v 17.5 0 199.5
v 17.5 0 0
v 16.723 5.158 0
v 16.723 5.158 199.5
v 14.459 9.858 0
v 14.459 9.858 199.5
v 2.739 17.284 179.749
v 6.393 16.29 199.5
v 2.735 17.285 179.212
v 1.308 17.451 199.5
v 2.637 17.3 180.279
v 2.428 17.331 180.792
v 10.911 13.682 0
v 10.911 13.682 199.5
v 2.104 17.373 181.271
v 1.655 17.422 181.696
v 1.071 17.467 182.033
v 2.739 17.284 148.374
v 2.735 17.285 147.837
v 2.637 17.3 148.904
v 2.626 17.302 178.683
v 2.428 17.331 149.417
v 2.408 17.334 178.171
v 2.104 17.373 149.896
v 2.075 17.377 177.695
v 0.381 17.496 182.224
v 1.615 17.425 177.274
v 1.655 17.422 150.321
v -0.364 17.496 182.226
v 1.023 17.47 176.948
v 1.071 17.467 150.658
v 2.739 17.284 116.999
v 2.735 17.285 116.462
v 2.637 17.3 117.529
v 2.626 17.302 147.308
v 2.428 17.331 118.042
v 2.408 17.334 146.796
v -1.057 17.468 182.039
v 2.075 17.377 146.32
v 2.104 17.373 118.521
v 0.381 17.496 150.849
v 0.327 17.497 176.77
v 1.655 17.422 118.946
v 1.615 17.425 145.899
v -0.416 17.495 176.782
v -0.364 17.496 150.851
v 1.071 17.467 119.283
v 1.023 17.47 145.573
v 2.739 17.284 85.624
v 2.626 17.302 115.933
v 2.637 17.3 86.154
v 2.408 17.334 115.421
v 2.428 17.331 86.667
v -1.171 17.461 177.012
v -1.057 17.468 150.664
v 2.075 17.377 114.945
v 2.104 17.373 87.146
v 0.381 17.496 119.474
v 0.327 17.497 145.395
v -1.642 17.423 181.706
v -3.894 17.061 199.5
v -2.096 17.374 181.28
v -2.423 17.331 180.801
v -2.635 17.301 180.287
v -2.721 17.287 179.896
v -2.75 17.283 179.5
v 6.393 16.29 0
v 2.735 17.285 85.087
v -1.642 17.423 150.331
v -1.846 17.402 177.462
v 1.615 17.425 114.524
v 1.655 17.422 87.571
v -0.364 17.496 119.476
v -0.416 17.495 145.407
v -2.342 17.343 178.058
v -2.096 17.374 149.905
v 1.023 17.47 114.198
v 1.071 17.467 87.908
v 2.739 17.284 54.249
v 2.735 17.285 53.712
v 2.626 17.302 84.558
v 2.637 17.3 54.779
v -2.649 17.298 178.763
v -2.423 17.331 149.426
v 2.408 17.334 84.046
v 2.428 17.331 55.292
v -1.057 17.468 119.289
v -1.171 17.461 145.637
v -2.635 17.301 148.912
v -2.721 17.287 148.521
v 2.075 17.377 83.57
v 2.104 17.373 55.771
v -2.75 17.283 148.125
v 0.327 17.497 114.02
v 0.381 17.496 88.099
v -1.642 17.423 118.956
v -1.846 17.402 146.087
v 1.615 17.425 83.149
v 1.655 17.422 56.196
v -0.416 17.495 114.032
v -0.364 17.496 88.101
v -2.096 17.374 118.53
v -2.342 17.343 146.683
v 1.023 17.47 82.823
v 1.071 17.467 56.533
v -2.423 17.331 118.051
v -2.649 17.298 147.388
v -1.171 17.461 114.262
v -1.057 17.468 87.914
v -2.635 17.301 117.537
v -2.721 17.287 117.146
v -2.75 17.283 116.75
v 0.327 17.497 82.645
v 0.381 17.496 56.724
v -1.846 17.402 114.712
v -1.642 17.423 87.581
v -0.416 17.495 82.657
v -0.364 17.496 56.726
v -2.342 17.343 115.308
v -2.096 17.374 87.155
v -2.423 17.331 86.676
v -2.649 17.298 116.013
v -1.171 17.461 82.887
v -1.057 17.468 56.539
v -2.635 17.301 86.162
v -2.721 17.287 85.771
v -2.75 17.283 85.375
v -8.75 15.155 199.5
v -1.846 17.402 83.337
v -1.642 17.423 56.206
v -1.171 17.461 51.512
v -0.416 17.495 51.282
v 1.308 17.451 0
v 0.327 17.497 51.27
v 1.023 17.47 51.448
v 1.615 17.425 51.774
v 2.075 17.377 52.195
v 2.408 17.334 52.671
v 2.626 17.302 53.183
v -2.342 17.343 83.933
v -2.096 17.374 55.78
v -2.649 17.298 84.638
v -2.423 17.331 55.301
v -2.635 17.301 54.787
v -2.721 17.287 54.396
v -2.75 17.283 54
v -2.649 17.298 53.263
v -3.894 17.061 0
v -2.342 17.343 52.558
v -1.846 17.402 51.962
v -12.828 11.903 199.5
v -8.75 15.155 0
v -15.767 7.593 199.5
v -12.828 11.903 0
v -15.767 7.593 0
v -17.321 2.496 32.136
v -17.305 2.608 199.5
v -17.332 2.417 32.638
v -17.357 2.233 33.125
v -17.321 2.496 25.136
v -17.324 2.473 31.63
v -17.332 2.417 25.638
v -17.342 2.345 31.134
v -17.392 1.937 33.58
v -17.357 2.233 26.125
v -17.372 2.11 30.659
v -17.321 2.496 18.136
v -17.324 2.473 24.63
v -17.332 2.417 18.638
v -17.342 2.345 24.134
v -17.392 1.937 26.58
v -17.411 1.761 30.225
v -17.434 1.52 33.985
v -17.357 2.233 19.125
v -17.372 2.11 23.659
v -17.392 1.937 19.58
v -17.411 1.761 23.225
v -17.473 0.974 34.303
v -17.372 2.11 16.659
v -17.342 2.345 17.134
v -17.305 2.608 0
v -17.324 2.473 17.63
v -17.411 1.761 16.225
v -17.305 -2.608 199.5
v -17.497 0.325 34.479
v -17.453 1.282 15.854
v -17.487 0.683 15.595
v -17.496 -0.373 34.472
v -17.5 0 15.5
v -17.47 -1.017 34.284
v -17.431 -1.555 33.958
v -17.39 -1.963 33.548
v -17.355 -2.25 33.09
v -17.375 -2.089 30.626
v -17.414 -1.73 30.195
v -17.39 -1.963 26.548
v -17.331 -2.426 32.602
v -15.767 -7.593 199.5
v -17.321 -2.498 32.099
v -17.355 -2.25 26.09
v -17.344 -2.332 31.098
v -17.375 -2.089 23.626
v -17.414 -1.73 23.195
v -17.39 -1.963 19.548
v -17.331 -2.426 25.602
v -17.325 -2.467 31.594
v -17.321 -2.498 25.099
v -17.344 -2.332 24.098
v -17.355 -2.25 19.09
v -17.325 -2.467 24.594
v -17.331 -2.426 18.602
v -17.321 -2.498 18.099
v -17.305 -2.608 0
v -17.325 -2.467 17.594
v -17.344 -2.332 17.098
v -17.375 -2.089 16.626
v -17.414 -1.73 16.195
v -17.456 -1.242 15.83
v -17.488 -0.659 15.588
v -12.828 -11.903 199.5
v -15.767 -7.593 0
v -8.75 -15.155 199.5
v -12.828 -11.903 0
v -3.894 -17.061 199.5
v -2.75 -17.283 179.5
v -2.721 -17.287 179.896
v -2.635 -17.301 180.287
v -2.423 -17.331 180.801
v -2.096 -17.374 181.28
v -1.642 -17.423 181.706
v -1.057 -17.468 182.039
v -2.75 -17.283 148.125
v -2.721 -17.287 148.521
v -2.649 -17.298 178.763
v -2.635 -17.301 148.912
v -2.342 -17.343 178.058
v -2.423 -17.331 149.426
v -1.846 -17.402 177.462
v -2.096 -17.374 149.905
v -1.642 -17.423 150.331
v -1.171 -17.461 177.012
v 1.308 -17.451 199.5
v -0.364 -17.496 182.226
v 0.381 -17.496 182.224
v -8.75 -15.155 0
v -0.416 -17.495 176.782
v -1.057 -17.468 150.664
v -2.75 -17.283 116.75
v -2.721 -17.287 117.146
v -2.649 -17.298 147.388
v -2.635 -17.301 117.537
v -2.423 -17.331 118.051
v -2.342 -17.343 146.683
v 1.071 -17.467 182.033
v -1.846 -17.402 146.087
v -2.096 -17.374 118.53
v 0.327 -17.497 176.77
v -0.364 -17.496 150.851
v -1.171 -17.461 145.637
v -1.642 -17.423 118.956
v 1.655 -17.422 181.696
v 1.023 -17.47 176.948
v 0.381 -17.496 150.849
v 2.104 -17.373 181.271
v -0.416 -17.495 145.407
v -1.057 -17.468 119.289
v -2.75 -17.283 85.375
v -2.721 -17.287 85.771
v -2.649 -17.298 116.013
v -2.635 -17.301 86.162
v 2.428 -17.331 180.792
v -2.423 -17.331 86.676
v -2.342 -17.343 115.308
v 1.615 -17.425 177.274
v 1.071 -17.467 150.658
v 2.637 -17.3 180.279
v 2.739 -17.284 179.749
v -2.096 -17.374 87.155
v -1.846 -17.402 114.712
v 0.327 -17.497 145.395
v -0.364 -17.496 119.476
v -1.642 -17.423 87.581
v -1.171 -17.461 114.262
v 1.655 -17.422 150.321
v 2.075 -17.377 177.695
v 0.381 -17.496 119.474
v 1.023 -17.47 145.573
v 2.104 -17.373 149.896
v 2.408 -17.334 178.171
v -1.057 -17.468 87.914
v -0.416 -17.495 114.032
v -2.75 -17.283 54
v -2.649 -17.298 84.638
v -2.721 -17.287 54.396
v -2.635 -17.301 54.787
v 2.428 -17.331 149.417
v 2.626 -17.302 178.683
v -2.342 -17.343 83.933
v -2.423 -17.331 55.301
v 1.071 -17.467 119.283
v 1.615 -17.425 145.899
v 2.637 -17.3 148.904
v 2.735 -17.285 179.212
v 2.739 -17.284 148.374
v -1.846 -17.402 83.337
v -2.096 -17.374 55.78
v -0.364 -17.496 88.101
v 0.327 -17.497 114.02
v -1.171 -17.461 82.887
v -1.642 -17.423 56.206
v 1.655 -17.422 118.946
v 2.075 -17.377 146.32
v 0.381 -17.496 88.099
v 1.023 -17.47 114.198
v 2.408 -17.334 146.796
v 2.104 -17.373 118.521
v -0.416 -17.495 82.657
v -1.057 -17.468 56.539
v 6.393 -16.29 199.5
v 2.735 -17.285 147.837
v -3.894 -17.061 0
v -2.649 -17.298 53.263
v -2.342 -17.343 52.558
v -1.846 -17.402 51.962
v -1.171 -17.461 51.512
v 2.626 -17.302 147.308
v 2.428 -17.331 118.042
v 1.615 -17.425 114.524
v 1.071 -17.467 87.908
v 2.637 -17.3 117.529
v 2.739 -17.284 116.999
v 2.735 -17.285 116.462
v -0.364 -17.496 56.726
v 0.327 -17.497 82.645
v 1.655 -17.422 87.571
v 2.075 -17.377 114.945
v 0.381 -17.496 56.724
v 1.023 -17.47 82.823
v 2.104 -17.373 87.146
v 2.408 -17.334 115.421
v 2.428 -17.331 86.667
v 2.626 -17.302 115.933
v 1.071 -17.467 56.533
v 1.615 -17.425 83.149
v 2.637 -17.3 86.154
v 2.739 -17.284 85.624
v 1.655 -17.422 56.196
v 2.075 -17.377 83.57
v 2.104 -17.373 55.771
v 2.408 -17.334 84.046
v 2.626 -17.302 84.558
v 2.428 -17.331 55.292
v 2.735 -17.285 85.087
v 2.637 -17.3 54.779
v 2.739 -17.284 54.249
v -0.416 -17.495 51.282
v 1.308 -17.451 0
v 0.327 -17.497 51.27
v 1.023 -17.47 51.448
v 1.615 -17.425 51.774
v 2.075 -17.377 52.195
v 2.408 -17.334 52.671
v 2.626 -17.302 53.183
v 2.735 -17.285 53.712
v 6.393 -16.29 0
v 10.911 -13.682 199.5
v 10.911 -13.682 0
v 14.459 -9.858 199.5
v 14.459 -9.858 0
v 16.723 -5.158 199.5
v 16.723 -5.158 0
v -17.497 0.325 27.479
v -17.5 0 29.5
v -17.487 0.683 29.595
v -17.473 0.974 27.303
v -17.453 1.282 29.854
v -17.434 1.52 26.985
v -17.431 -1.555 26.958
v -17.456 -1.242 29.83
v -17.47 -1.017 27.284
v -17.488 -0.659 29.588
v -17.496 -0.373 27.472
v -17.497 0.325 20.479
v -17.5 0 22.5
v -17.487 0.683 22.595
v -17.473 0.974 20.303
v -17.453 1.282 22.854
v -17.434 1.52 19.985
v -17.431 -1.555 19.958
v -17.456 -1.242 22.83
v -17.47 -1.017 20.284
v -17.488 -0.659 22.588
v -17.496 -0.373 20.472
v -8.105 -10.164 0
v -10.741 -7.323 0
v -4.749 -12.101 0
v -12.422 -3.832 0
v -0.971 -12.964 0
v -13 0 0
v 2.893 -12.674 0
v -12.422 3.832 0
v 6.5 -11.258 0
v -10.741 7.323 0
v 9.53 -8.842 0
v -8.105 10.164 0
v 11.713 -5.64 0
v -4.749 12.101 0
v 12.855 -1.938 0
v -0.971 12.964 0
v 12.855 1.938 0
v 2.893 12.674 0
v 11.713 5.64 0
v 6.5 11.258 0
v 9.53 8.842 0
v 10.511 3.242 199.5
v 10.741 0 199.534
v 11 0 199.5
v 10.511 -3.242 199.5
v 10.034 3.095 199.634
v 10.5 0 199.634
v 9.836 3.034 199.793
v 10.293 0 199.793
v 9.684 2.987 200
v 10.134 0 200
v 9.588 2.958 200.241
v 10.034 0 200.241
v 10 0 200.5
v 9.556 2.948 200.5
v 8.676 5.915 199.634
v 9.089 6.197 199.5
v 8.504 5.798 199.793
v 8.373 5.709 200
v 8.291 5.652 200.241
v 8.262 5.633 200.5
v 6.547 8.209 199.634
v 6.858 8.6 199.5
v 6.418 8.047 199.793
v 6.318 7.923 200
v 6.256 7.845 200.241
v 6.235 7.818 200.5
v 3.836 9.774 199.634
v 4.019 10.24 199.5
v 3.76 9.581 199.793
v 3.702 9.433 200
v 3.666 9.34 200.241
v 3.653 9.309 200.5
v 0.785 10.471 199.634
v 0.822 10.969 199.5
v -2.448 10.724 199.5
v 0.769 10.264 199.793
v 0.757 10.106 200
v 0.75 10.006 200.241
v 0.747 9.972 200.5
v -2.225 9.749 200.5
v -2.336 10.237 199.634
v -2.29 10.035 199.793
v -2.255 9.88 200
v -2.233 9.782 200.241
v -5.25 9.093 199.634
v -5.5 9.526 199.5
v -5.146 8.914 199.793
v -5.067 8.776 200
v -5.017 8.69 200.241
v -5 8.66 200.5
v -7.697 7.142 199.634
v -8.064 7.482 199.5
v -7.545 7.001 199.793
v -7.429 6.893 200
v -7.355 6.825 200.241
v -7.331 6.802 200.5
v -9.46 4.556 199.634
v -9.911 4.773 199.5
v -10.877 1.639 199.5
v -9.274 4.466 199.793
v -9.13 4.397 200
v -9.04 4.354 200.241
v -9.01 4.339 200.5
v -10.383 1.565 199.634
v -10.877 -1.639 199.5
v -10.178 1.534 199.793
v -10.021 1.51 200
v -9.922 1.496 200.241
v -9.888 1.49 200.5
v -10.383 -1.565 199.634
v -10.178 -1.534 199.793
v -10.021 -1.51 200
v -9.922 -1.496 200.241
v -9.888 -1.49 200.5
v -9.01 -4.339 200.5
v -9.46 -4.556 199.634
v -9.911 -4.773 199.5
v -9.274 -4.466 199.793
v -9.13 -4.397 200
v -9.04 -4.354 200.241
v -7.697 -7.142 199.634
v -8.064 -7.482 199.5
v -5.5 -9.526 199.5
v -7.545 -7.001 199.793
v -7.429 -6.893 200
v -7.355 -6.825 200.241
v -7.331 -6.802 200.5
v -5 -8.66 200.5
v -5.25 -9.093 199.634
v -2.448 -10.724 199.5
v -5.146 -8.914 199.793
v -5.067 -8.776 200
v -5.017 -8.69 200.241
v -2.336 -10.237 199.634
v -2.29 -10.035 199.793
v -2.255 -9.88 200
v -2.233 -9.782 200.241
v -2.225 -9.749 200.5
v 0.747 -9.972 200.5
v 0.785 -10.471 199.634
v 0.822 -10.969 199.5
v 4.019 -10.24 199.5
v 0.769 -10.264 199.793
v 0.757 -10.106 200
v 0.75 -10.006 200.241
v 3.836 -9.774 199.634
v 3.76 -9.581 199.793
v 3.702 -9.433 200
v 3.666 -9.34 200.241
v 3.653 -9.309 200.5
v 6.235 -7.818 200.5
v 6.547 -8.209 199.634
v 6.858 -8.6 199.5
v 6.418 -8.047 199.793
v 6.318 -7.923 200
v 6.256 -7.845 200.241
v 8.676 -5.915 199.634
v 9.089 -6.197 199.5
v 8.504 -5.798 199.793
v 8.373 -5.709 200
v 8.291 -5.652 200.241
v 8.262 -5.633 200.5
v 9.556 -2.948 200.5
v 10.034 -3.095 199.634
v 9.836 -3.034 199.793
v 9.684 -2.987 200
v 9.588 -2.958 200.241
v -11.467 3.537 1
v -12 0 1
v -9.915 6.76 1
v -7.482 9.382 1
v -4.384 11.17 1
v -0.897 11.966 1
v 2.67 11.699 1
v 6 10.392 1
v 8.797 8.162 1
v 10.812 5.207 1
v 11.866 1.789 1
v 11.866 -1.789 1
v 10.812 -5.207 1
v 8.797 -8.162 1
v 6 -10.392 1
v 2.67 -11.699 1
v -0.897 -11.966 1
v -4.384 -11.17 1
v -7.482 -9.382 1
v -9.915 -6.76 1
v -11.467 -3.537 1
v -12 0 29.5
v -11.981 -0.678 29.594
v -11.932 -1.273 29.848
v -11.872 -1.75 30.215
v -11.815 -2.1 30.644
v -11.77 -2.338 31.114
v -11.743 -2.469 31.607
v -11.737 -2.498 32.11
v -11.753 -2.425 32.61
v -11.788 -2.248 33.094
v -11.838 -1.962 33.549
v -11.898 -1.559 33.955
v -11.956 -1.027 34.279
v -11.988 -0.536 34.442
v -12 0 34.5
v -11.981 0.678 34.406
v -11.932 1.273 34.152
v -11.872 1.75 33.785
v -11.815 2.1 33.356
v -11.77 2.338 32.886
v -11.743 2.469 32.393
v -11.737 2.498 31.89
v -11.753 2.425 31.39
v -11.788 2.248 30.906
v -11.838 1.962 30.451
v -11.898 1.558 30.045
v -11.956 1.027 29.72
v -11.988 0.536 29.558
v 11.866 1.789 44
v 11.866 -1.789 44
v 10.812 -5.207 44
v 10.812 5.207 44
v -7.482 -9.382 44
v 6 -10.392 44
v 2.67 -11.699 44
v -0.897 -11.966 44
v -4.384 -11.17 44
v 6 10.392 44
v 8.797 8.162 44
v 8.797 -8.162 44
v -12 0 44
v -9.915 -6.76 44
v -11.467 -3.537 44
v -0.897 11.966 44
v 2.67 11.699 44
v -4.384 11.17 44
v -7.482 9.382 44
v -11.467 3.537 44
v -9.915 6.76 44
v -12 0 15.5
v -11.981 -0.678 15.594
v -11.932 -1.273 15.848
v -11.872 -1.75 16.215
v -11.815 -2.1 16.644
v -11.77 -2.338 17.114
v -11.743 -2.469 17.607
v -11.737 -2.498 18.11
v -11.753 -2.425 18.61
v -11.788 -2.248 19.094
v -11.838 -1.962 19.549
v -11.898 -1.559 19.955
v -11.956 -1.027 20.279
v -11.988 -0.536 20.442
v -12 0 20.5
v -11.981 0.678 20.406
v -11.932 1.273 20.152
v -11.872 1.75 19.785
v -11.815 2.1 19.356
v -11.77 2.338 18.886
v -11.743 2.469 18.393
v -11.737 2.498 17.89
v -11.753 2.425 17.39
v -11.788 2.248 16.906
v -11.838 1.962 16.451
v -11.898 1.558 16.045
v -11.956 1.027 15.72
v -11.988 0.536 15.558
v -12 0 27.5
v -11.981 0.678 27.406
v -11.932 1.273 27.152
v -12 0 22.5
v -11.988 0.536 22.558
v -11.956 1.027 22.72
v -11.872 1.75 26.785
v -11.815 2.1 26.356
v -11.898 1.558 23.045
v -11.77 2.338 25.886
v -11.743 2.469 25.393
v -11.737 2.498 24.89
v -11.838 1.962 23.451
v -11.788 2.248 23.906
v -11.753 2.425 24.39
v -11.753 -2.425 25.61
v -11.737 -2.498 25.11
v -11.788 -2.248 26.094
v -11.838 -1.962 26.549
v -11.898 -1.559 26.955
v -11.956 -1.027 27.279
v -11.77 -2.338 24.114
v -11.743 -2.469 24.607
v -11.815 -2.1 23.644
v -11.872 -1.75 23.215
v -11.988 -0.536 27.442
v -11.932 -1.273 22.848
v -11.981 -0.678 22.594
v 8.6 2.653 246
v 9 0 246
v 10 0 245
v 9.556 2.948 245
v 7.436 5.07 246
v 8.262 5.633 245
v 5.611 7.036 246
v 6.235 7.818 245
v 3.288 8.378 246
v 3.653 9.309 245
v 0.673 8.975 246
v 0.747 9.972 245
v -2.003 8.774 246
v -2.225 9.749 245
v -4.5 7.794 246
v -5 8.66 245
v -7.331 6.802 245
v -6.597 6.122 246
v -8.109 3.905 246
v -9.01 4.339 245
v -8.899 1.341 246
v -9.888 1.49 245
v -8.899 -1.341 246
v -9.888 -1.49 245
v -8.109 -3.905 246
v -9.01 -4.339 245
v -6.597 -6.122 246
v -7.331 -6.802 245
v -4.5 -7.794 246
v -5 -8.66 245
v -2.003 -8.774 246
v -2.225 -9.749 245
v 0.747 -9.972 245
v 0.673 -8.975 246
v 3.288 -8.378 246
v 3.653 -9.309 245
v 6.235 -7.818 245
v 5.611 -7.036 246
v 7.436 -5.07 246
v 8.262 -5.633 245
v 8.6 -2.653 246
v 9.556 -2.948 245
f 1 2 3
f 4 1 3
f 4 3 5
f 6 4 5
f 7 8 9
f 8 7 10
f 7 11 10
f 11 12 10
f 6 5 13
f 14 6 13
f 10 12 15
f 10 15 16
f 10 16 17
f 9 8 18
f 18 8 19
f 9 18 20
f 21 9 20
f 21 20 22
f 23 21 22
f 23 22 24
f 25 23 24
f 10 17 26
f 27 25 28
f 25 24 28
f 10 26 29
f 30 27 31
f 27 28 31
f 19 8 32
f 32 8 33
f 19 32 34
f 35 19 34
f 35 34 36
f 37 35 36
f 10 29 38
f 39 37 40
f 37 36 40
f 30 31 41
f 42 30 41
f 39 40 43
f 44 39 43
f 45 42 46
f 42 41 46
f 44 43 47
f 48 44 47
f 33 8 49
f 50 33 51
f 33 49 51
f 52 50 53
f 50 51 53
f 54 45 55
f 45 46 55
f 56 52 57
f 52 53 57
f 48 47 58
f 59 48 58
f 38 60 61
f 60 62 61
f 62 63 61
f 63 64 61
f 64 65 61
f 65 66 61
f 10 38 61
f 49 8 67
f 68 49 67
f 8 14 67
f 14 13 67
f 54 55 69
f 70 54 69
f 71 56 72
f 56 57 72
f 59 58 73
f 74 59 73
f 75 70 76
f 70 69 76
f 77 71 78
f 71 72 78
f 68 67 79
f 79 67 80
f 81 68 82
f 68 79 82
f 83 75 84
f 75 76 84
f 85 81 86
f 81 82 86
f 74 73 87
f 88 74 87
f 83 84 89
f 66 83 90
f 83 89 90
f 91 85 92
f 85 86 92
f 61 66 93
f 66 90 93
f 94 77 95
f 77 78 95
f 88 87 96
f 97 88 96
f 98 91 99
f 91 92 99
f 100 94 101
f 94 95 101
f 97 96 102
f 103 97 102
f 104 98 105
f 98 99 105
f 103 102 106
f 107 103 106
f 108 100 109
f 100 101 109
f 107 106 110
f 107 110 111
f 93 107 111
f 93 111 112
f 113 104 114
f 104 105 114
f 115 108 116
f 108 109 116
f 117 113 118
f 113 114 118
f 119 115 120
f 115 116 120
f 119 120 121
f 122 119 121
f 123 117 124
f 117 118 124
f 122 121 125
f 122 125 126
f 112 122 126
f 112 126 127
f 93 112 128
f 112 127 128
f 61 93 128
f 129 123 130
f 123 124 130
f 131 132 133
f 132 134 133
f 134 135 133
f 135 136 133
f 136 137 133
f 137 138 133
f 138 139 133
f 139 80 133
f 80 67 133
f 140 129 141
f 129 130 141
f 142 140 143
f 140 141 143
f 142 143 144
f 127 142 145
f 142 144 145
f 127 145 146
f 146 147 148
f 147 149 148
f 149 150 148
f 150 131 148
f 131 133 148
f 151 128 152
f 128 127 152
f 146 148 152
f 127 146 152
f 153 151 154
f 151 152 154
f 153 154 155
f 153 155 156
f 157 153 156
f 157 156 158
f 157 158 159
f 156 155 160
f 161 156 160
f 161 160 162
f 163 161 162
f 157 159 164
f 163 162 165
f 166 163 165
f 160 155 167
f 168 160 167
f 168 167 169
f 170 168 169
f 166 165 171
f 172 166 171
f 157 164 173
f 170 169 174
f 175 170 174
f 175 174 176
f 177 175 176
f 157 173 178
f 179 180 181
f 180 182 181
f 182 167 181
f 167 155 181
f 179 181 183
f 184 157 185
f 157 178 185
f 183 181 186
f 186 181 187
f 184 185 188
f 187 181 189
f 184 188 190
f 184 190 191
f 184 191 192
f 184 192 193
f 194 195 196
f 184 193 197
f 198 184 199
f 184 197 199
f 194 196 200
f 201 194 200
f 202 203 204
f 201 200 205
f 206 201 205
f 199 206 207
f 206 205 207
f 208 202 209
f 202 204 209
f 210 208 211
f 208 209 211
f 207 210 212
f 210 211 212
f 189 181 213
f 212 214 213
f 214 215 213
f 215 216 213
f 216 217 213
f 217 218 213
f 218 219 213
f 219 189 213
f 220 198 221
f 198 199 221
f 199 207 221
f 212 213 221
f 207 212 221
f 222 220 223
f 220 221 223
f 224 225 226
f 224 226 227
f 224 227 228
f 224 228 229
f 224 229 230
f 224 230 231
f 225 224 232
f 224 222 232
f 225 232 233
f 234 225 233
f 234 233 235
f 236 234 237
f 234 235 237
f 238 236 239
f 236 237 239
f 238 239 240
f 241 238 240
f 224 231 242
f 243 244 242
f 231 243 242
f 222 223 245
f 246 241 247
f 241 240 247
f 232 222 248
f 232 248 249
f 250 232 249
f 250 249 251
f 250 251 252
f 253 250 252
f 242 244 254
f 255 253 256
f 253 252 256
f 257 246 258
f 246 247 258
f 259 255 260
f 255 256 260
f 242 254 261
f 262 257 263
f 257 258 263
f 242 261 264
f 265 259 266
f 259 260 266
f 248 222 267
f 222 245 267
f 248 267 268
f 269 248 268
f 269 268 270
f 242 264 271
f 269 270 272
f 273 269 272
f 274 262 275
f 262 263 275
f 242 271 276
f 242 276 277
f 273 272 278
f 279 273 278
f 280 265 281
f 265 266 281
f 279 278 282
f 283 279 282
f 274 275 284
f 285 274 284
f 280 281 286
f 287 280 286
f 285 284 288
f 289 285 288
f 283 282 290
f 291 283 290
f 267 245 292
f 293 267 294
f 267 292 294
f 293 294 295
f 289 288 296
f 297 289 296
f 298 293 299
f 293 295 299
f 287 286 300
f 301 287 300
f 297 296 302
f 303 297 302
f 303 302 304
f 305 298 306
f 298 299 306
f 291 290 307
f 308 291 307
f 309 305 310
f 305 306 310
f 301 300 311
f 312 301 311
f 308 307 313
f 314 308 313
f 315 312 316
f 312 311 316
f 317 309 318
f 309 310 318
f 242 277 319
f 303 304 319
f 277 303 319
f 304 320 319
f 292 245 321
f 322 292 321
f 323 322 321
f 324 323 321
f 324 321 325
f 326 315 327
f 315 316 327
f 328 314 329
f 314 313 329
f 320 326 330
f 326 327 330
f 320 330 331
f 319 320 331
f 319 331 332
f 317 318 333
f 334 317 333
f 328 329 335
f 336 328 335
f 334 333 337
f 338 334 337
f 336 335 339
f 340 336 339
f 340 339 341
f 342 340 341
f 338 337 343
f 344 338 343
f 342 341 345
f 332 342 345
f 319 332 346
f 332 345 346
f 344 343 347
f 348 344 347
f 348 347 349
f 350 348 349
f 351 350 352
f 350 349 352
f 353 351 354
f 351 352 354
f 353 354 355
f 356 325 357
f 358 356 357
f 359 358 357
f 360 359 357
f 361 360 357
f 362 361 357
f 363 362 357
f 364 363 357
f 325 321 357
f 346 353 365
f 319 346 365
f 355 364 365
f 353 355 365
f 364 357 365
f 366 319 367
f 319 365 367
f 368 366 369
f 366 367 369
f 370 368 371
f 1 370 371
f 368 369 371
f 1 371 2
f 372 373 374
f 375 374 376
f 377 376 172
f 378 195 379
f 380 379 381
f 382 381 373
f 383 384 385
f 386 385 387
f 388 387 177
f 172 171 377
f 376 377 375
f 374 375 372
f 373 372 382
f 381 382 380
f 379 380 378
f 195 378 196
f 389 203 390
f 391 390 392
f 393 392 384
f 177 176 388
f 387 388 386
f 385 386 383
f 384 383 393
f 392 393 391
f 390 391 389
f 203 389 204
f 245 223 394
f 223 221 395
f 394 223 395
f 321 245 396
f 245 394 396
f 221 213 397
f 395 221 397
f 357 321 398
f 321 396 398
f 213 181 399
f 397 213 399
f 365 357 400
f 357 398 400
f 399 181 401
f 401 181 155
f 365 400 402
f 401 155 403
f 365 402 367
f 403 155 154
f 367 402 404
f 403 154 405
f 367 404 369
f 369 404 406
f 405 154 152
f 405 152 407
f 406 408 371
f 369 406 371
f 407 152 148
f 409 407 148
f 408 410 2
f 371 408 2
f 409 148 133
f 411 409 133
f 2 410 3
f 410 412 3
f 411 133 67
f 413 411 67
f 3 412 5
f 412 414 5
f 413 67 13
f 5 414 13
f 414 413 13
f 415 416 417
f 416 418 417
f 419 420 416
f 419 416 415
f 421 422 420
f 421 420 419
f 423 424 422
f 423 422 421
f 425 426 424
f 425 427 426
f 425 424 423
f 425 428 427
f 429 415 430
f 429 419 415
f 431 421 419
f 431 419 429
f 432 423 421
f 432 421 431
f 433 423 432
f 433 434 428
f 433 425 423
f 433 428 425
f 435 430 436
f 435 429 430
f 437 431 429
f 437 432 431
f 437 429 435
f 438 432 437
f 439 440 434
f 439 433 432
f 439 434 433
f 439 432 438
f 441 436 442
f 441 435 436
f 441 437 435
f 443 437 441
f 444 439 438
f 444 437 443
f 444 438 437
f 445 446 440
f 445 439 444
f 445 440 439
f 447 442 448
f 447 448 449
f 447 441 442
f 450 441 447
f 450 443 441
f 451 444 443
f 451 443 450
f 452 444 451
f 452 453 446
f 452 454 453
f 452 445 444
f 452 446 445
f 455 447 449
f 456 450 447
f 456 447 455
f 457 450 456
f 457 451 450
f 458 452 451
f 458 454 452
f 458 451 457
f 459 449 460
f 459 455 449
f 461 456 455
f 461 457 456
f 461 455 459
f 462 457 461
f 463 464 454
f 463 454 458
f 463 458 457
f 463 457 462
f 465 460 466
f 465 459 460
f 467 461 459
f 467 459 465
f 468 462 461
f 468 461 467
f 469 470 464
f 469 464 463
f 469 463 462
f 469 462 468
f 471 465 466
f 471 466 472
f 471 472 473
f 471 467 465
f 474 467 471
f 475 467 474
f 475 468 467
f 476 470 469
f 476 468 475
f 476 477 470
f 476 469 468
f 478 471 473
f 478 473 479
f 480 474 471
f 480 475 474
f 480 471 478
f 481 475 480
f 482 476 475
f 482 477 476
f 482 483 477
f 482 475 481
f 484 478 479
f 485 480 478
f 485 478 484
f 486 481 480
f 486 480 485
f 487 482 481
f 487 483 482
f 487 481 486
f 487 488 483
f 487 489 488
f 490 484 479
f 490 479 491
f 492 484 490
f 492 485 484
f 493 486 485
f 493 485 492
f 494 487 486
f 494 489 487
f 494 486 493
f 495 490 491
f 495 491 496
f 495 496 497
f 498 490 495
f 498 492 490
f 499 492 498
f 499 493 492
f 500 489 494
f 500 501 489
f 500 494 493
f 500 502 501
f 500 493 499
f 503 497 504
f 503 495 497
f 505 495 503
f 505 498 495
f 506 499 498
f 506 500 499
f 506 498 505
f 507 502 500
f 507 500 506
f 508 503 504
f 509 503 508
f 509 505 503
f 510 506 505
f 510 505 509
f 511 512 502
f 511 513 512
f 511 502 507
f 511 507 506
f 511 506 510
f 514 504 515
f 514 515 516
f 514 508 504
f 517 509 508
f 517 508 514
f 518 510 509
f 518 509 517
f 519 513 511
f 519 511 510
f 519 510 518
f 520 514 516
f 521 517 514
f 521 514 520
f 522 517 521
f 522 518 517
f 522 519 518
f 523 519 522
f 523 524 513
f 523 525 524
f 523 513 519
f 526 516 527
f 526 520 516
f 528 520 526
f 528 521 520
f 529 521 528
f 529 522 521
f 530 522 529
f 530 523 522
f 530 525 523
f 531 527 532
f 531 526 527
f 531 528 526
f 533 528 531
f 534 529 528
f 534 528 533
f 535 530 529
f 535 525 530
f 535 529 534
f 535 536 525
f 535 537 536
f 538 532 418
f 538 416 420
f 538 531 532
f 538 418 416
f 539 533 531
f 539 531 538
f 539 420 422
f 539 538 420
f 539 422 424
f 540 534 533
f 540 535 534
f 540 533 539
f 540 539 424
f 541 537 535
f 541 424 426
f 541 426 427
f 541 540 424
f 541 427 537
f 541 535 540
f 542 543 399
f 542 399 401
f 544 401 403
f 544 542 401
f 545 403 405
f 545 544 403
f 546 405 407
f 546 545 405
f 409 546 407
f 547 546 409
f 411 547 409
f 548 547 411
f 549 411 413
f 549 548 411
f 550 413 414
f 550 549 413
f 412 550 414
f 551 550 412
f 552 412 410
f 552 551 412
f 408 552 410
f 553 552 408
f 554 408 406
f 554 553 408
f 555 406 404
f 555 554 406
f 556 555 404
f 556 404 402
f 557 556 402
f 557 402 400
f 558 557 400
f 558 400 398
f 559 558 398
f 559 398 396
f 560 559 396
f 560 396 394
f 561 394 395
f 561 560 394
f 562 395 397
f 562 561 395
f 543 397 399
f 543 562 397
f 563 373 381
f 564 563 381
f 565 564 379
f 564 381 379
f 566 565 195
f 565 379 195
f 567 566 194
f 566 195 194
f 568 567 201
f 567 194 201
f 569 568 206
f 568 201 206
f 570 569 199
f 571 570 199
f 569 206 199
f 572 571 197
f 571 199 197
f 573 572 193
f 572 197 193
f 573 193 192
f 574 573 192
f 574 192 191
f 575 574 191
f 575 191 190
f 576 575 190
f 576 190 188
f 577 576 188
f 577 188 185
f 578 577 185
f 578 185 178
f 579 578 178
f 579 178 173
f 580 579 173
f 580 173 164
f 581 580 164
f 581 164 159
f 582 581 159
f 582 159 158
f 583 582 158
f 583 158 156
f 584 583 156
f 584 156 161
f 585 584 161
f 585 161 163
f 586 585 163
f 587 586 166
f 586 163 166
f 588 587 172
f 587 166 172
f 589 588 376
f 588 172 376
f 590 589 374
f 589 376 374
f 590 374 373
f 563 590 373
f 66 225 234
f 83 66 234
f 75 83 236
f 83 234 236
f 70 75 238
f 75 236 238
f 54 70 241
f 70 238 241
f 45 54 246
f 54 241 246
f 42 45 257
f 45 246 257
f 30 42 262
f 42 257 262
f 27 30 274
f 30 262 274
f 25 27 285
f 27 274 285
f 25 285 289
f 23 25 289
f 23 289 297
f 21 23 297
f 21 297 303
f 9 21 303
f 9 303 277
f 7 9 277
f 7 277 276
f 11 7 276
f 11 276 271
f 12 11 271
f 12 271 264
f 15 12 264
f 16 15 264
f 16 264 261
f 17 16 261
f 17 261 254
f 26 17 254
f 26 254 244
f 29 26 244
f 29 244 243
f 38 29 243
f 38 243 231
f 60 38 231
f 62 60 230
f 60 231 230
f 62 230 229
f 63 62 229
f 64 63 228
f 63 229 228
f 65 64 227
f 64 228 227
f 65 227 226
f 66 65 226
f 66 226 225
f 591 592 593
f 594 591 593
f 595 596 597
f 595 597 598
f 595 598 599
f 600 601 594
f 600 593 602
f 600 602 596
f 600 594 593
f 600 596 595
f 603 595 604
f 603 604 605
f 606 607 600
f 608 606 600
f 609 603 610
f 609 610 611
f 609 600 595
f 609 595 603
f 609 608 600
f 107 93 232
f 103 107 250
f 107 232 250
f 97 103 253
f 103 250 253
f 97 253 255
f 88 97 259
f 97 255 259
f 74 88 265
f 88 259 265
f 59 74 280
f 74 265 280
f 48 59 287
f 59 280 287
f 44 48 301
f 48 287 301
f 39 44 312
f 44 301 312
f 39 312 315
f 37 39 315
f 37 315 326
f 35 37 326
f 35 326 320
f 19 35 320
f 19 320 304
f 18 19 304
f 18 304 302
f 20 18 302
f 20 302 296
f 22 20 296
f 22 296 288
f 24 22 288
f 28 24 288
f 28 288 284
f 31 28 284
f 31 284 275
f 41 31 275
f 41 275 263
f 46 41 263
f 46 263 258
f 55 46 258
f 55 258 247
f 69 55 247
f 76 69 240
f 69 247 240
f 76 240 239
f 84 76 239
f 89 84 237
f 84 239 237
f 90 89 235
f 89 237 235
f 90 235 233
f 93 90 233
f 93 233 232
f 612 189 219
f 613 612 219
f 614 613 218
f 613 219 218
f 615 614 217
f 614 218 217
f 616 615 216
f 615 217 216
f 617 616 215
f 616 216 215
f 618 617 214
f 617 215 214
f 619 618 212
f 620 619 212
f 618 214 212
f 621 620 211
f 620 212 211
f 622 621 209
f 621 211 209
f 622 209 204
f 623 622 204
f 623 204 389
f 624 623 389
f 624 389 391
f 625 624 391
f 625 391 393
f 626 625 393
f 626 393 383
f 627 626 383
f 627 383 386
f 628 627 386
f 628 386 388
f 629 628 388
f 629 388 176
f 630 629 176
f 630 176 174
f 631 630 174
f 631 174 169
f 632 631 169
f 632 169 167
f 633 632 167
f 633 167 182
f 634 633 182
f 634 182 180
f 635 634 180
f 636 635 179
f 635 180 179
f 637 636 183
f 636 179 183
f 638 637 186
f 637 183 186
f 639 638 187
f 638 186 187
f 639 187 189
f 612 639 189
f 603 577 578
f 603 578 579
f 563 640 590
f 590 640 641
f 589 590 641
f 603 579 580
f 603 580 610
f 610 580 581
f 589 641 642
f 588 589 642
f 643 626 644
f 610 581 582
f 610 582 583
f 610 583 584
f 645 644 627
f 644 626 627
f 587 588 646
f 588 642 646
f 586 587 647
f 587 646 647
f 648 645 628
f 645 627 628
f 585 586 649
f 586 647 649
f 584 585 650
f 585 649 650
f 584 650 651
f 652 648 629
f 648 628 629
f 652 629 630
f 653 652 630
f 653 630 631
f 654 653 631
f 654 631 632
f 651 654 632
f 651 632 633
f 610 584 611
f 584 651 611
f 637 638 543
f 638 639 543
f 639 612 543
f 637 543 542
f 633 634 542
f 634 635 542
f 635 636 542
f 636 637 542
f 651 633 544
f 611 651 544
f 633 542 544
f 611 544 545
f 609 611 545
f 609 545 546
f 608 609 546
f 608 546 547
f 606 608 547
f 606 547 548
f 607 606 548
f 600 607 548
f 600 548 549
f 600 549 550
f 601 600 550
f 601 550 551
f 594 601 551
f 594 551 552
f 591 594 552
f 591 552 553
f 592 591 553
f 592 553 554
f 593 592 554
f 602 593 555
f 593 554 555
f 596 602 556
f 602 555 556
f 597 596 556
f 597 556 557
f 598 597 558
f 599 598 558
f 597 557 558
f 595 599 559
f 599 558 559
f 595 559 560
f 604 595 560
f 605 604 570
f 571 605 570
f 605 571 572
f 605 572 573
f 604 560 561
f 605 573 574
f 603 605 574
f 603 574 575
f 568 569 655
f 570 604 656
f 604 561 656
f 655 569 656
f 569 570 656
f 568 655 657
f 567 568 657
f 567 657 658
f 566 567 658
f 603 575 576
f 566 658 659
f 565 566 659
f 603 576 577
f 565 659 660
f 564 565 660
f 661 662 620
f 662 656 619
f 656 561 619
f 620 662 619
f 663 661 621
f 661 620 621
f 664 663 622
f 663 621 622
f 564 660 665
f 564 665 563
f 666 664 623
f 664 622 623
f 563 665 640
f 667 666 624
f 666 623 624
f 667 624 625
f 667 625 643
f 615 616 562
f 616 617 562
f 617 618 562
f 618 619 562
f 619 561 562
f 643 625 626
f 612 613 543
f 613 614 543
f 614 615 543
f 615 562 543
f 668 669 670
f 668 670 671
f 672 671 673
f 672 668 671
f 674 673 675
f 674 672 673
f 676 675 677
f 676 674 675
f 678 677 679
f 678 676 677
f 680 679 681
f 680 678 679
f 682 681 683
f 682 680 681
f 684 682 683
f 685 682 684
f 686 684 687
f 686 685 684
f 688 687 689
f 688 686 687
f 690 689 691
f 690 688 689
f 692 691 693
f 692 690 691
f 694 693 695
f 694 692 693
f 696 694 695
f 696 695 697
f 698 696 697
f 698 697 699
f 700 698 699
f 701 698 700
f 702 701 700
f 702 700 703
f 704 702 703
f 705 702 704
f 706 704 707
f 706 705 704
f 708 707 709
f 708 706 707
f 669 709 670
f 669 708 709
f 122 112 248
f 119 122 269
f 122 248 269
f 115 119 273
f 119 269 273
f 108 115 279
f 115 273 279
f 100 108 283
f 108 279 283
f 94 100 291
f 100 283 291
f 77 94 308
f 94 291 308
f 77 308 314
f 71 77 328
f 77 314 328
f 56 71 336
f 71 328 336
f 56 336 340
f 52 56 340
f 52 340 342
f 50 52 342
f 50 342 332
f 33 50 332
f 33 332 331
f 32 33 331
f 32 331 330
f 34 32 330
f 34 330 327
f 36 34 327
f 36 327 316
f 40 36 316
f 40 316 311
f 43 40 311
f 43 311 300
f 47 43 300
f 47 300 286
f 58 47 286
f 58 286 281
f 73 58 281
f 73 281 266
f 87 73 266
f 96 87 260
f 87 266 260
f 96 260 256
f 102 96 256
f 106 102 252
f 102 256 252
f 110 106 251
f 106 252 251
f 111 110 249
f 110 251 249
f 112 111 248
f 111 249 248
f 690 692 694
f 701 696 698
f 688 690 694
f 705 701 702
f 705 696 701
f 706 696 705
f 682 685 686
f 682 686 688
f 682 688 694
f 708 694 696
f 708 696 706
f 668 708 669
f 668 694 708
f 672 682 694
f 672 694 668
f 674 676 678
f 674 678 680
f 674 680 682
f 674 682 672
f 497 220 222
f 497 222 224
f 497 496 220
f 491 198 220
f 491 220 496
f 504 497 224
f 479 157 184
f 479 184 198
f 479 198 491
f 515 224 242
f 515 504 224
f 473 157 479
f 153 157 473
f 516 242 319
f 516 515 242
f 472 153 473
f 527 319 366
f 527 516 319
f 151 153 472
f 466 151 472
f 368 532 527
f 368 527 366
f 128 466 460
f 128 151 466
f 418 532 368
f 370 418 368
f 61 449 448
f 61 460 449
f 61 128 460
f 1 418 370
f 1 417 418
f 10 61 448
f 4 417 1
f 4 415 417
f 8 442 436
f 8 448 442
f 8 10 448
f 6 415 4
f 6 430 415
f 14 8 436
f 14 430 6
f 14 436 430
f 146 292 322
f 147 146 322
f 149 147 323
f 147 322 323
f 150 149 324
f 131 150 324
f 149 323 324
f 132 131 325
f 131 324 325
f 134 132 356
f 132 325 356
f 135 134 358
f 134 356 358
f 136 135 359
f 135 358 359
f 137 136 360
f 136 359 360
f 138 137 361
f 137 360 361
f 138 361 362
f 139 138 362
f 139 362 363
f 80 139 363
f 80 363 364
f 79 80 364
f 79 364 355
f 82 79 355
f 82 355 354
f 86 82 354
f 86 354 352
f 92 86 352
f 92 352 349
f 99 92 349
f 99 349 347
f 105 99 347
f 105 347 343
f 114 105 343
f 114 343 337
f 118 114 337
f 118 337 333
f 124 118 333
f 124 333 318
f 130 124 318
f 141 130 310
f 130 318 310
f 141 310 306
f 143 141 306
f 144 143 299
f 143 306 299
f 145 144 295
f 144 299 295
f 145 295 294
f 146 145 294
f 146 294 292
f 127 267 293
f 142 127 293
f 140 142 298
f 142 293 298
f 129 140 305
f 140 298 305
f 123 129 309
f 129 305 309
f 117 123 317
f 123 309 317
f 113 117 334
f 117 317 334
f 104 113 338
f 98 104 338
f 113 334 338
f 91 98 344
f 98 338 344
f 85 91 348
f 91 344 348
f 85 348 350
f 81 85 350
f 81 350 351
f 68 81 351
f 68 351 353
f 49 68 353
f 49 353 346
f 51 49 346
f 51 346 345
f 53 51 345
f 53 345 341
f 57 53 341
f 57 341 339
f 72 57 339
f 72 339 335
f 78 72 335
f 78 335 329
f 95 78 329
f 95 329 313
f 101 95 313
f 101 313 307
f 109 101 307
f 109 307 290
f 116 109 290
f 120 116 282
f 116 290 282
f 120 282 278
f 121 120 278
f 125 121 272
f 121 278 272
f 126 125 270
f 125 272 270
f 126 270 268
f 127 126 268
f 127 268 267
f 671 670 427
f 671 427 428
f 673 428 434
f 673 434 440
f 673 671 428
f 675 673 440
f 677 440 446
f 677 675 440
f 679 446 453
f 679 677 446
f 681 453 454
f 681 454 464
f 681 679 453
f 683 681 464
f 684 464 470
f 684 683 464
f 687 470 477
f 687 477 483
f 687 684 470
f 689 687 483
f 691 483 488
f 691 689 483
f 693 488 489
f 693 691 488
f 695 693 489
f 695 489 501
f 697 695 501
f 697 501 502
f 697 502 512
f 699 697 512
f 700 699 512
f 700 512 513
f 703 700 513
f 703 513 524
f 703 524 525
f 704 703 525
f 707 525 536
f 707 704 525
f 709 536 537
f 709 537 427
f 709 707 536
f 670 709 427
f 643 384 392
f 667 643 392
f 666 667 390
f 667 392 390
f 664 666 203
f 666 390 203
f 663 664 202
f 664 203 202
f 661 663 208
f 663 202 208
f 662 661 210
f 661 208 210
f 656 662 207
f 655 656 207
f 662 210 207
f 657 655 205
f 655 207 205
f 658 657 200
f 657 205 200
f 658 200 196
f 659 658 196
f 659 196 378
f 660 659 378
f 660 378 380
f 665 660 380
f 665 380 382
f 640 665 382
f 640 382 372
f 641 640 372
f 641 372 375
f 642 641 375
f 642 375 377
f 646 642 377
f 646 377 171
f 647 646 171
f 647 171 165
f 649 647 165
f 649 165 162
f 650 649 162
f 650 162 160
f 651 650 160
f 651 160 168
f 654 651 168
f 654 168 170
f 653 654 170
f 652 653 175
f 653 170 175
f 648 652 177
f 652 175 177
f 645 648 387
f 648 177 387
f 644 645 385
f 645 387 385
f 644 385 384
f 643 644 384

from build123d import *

# Parameters (mm, degrees)
ESQUISSE1_R                               = 17.5
BOSS_EXTRU_1_DEPTH                        = 246
ESQUISSE2_R                               = 12
ENL_V_MAT_EXTRU_1_DEPTH                   = 44
TROU_TARAUD_M62_REACH                     = 37
TROU_TARAUD_M62_BORE_R                    = 2.5
ESQUISSE11_R                              = 17.5
ESQUISSE11_R_2                            = 10
ENL_V_MAT_EXTRU_3_DEPTH                   = 46.5
CONG_1_R                                  = 1
CHANFREIN1_SIZE                           = 1
TROU_POUR_TARAUDAGE_POUR_TROU_TARAUD_M6_D = 5.5


with BuildPart() as part:
    # Esquisse1 → Boss.-Extru.1 (new body)
    with BuildSketch(Plane.XY):
        Circle(ESQUISSE1_R)
    extrude(amount=BOSS_EXTRU_1_DEPTH)

    # Esquisse2 → Enlèv. mat.-Extru.1 (cut)
    with BuildSketch(Plane(origin=(0, 0, 0), x_dir=(-1, 0, 0), z_dir=(0, 0, -1))):
        Circle(ESQUISSE2_R)
    extrude(amount=-ENL_V_MAT_EXTRU_1_DEPTH, mode=Mode.SUBTRACT)

    # Trou taraudé M62 bore (on position points) → Trou taraudé M62 (cut, up to next)
    with BuildSketch(Plane(origin=(-17.5, 0, 32), x_dir=(0, 0, -1), z_dir=(-1, 0, 0)), mode=Mode.PRIVATE) as trou_taraud_m62_sk1:
        Circle(TROU_TARAUD_M62_BORE_R)
    trou_taraud_m62_tool1 = extrude(trou_taraud_m62_sk1.sketch, amount=-TROU_TARAUD_M62_REACH, mode=Mode.PRIVATE) & part.part
    add(trou_taraud_m62_tool1.solids().sort_by_distance((-17.5, 0, 32))[0], mode=Mode.SUBTRACT)
    # Trou taraudé M62 bore (on position points) → Trou taraudé M62 (cut, up to next)
    with BuildSketch(Plane(origin=(-17.5, 0, 32), x_dir=(0, 0, -1), z_dir=(-1, 0, 0)), mode=Mode.PRIVATE) as trou_taraud_m62_sk2:
        with Locations((7, 0)):
            Circle(TROU_TARAUD_M62_BORE_R)
    trou_taraud_m62_tool2 = extrude(trou_taraud_m62_sk2.sketch, amount=-TROU_TARAUD_M62_REACH, mode=Mode.PRIVATE) & part.part
    add(trou_taraud_m62_tool2.solids().sort_by_distance((-17.5, 0, 25))[0], mode=Mode.SUBTRACT)
    # Trou taraudé M62 bore (on position points) → Trou taraudé M62 (cut, up to next)
    with BuildSketch(Plane(origin=(-17.5, 0, 32), x_dir=(0, 0, -1), z_dir=(-1, 0, 0)), mode=Mode.PRIVATE) as trou_taraud_m62_sk3:
        with Locations((14, 0)):
            Circle(TROU_TARAUD_M62_BORE_R)
    trou_taraud_m62_tool3 = extrude(trou_taraud_m62_sk3.sketch, amount=-TROU_TARAUD_M62_REACH, mode=Mode.PRIVATE) & part.part
    add(trou_taraud_m62_tool3.solids().sort_by_distance((-17.5, 0, 18))[0], mode=Mode.SUBTRACT)

    # Esquisse11 → Enlèv. mat.-Extru.3 (cut)
    with BuildSketch(Plane.XY.offset(246)):
        Circle(ESQUISSE11_R)
        Circle(ESQUISSE11_R_2, mode=Mode.SUBTRACT)
    extrude(amount=-ENL_V_MAT_EXTRU_3_DEPTH, mode=Mode.SUBTRACT)

    # Congé1
    cong_1_edges = [part.edges().sort_by_distance(p)[0] for p in [
        (-10, 0, 199.5),
    ]]
    fillet(cong_1_edges, radius=CONG_1_R)

    # Chanfrein1
    chanfrein1_edges = [part.edges().sort_by_distance(p)[0] for p in [
        (-10, 0, 246),
        (12, 0, 0),
    ]]
    chamfer(chanfrein1_edges, length=CHANFREIN1_SIZE)

    # Trou pour taraudage pour trou taraudé M62 (through all)
    with Locations(Plane(origin=(0, 17.5, 0), x_dir=(1, 0, 0), z_dir=(0, 1, 0))):
        with Locations((0, -54), (0, -116.75), (0, -179.5), (0, -85.375), (0, -148.125)):
            Hole(TROU_POUR_TARAUDAGE_POUR_TROU_TARAUD_M6_D / 2)


solid = part.part
